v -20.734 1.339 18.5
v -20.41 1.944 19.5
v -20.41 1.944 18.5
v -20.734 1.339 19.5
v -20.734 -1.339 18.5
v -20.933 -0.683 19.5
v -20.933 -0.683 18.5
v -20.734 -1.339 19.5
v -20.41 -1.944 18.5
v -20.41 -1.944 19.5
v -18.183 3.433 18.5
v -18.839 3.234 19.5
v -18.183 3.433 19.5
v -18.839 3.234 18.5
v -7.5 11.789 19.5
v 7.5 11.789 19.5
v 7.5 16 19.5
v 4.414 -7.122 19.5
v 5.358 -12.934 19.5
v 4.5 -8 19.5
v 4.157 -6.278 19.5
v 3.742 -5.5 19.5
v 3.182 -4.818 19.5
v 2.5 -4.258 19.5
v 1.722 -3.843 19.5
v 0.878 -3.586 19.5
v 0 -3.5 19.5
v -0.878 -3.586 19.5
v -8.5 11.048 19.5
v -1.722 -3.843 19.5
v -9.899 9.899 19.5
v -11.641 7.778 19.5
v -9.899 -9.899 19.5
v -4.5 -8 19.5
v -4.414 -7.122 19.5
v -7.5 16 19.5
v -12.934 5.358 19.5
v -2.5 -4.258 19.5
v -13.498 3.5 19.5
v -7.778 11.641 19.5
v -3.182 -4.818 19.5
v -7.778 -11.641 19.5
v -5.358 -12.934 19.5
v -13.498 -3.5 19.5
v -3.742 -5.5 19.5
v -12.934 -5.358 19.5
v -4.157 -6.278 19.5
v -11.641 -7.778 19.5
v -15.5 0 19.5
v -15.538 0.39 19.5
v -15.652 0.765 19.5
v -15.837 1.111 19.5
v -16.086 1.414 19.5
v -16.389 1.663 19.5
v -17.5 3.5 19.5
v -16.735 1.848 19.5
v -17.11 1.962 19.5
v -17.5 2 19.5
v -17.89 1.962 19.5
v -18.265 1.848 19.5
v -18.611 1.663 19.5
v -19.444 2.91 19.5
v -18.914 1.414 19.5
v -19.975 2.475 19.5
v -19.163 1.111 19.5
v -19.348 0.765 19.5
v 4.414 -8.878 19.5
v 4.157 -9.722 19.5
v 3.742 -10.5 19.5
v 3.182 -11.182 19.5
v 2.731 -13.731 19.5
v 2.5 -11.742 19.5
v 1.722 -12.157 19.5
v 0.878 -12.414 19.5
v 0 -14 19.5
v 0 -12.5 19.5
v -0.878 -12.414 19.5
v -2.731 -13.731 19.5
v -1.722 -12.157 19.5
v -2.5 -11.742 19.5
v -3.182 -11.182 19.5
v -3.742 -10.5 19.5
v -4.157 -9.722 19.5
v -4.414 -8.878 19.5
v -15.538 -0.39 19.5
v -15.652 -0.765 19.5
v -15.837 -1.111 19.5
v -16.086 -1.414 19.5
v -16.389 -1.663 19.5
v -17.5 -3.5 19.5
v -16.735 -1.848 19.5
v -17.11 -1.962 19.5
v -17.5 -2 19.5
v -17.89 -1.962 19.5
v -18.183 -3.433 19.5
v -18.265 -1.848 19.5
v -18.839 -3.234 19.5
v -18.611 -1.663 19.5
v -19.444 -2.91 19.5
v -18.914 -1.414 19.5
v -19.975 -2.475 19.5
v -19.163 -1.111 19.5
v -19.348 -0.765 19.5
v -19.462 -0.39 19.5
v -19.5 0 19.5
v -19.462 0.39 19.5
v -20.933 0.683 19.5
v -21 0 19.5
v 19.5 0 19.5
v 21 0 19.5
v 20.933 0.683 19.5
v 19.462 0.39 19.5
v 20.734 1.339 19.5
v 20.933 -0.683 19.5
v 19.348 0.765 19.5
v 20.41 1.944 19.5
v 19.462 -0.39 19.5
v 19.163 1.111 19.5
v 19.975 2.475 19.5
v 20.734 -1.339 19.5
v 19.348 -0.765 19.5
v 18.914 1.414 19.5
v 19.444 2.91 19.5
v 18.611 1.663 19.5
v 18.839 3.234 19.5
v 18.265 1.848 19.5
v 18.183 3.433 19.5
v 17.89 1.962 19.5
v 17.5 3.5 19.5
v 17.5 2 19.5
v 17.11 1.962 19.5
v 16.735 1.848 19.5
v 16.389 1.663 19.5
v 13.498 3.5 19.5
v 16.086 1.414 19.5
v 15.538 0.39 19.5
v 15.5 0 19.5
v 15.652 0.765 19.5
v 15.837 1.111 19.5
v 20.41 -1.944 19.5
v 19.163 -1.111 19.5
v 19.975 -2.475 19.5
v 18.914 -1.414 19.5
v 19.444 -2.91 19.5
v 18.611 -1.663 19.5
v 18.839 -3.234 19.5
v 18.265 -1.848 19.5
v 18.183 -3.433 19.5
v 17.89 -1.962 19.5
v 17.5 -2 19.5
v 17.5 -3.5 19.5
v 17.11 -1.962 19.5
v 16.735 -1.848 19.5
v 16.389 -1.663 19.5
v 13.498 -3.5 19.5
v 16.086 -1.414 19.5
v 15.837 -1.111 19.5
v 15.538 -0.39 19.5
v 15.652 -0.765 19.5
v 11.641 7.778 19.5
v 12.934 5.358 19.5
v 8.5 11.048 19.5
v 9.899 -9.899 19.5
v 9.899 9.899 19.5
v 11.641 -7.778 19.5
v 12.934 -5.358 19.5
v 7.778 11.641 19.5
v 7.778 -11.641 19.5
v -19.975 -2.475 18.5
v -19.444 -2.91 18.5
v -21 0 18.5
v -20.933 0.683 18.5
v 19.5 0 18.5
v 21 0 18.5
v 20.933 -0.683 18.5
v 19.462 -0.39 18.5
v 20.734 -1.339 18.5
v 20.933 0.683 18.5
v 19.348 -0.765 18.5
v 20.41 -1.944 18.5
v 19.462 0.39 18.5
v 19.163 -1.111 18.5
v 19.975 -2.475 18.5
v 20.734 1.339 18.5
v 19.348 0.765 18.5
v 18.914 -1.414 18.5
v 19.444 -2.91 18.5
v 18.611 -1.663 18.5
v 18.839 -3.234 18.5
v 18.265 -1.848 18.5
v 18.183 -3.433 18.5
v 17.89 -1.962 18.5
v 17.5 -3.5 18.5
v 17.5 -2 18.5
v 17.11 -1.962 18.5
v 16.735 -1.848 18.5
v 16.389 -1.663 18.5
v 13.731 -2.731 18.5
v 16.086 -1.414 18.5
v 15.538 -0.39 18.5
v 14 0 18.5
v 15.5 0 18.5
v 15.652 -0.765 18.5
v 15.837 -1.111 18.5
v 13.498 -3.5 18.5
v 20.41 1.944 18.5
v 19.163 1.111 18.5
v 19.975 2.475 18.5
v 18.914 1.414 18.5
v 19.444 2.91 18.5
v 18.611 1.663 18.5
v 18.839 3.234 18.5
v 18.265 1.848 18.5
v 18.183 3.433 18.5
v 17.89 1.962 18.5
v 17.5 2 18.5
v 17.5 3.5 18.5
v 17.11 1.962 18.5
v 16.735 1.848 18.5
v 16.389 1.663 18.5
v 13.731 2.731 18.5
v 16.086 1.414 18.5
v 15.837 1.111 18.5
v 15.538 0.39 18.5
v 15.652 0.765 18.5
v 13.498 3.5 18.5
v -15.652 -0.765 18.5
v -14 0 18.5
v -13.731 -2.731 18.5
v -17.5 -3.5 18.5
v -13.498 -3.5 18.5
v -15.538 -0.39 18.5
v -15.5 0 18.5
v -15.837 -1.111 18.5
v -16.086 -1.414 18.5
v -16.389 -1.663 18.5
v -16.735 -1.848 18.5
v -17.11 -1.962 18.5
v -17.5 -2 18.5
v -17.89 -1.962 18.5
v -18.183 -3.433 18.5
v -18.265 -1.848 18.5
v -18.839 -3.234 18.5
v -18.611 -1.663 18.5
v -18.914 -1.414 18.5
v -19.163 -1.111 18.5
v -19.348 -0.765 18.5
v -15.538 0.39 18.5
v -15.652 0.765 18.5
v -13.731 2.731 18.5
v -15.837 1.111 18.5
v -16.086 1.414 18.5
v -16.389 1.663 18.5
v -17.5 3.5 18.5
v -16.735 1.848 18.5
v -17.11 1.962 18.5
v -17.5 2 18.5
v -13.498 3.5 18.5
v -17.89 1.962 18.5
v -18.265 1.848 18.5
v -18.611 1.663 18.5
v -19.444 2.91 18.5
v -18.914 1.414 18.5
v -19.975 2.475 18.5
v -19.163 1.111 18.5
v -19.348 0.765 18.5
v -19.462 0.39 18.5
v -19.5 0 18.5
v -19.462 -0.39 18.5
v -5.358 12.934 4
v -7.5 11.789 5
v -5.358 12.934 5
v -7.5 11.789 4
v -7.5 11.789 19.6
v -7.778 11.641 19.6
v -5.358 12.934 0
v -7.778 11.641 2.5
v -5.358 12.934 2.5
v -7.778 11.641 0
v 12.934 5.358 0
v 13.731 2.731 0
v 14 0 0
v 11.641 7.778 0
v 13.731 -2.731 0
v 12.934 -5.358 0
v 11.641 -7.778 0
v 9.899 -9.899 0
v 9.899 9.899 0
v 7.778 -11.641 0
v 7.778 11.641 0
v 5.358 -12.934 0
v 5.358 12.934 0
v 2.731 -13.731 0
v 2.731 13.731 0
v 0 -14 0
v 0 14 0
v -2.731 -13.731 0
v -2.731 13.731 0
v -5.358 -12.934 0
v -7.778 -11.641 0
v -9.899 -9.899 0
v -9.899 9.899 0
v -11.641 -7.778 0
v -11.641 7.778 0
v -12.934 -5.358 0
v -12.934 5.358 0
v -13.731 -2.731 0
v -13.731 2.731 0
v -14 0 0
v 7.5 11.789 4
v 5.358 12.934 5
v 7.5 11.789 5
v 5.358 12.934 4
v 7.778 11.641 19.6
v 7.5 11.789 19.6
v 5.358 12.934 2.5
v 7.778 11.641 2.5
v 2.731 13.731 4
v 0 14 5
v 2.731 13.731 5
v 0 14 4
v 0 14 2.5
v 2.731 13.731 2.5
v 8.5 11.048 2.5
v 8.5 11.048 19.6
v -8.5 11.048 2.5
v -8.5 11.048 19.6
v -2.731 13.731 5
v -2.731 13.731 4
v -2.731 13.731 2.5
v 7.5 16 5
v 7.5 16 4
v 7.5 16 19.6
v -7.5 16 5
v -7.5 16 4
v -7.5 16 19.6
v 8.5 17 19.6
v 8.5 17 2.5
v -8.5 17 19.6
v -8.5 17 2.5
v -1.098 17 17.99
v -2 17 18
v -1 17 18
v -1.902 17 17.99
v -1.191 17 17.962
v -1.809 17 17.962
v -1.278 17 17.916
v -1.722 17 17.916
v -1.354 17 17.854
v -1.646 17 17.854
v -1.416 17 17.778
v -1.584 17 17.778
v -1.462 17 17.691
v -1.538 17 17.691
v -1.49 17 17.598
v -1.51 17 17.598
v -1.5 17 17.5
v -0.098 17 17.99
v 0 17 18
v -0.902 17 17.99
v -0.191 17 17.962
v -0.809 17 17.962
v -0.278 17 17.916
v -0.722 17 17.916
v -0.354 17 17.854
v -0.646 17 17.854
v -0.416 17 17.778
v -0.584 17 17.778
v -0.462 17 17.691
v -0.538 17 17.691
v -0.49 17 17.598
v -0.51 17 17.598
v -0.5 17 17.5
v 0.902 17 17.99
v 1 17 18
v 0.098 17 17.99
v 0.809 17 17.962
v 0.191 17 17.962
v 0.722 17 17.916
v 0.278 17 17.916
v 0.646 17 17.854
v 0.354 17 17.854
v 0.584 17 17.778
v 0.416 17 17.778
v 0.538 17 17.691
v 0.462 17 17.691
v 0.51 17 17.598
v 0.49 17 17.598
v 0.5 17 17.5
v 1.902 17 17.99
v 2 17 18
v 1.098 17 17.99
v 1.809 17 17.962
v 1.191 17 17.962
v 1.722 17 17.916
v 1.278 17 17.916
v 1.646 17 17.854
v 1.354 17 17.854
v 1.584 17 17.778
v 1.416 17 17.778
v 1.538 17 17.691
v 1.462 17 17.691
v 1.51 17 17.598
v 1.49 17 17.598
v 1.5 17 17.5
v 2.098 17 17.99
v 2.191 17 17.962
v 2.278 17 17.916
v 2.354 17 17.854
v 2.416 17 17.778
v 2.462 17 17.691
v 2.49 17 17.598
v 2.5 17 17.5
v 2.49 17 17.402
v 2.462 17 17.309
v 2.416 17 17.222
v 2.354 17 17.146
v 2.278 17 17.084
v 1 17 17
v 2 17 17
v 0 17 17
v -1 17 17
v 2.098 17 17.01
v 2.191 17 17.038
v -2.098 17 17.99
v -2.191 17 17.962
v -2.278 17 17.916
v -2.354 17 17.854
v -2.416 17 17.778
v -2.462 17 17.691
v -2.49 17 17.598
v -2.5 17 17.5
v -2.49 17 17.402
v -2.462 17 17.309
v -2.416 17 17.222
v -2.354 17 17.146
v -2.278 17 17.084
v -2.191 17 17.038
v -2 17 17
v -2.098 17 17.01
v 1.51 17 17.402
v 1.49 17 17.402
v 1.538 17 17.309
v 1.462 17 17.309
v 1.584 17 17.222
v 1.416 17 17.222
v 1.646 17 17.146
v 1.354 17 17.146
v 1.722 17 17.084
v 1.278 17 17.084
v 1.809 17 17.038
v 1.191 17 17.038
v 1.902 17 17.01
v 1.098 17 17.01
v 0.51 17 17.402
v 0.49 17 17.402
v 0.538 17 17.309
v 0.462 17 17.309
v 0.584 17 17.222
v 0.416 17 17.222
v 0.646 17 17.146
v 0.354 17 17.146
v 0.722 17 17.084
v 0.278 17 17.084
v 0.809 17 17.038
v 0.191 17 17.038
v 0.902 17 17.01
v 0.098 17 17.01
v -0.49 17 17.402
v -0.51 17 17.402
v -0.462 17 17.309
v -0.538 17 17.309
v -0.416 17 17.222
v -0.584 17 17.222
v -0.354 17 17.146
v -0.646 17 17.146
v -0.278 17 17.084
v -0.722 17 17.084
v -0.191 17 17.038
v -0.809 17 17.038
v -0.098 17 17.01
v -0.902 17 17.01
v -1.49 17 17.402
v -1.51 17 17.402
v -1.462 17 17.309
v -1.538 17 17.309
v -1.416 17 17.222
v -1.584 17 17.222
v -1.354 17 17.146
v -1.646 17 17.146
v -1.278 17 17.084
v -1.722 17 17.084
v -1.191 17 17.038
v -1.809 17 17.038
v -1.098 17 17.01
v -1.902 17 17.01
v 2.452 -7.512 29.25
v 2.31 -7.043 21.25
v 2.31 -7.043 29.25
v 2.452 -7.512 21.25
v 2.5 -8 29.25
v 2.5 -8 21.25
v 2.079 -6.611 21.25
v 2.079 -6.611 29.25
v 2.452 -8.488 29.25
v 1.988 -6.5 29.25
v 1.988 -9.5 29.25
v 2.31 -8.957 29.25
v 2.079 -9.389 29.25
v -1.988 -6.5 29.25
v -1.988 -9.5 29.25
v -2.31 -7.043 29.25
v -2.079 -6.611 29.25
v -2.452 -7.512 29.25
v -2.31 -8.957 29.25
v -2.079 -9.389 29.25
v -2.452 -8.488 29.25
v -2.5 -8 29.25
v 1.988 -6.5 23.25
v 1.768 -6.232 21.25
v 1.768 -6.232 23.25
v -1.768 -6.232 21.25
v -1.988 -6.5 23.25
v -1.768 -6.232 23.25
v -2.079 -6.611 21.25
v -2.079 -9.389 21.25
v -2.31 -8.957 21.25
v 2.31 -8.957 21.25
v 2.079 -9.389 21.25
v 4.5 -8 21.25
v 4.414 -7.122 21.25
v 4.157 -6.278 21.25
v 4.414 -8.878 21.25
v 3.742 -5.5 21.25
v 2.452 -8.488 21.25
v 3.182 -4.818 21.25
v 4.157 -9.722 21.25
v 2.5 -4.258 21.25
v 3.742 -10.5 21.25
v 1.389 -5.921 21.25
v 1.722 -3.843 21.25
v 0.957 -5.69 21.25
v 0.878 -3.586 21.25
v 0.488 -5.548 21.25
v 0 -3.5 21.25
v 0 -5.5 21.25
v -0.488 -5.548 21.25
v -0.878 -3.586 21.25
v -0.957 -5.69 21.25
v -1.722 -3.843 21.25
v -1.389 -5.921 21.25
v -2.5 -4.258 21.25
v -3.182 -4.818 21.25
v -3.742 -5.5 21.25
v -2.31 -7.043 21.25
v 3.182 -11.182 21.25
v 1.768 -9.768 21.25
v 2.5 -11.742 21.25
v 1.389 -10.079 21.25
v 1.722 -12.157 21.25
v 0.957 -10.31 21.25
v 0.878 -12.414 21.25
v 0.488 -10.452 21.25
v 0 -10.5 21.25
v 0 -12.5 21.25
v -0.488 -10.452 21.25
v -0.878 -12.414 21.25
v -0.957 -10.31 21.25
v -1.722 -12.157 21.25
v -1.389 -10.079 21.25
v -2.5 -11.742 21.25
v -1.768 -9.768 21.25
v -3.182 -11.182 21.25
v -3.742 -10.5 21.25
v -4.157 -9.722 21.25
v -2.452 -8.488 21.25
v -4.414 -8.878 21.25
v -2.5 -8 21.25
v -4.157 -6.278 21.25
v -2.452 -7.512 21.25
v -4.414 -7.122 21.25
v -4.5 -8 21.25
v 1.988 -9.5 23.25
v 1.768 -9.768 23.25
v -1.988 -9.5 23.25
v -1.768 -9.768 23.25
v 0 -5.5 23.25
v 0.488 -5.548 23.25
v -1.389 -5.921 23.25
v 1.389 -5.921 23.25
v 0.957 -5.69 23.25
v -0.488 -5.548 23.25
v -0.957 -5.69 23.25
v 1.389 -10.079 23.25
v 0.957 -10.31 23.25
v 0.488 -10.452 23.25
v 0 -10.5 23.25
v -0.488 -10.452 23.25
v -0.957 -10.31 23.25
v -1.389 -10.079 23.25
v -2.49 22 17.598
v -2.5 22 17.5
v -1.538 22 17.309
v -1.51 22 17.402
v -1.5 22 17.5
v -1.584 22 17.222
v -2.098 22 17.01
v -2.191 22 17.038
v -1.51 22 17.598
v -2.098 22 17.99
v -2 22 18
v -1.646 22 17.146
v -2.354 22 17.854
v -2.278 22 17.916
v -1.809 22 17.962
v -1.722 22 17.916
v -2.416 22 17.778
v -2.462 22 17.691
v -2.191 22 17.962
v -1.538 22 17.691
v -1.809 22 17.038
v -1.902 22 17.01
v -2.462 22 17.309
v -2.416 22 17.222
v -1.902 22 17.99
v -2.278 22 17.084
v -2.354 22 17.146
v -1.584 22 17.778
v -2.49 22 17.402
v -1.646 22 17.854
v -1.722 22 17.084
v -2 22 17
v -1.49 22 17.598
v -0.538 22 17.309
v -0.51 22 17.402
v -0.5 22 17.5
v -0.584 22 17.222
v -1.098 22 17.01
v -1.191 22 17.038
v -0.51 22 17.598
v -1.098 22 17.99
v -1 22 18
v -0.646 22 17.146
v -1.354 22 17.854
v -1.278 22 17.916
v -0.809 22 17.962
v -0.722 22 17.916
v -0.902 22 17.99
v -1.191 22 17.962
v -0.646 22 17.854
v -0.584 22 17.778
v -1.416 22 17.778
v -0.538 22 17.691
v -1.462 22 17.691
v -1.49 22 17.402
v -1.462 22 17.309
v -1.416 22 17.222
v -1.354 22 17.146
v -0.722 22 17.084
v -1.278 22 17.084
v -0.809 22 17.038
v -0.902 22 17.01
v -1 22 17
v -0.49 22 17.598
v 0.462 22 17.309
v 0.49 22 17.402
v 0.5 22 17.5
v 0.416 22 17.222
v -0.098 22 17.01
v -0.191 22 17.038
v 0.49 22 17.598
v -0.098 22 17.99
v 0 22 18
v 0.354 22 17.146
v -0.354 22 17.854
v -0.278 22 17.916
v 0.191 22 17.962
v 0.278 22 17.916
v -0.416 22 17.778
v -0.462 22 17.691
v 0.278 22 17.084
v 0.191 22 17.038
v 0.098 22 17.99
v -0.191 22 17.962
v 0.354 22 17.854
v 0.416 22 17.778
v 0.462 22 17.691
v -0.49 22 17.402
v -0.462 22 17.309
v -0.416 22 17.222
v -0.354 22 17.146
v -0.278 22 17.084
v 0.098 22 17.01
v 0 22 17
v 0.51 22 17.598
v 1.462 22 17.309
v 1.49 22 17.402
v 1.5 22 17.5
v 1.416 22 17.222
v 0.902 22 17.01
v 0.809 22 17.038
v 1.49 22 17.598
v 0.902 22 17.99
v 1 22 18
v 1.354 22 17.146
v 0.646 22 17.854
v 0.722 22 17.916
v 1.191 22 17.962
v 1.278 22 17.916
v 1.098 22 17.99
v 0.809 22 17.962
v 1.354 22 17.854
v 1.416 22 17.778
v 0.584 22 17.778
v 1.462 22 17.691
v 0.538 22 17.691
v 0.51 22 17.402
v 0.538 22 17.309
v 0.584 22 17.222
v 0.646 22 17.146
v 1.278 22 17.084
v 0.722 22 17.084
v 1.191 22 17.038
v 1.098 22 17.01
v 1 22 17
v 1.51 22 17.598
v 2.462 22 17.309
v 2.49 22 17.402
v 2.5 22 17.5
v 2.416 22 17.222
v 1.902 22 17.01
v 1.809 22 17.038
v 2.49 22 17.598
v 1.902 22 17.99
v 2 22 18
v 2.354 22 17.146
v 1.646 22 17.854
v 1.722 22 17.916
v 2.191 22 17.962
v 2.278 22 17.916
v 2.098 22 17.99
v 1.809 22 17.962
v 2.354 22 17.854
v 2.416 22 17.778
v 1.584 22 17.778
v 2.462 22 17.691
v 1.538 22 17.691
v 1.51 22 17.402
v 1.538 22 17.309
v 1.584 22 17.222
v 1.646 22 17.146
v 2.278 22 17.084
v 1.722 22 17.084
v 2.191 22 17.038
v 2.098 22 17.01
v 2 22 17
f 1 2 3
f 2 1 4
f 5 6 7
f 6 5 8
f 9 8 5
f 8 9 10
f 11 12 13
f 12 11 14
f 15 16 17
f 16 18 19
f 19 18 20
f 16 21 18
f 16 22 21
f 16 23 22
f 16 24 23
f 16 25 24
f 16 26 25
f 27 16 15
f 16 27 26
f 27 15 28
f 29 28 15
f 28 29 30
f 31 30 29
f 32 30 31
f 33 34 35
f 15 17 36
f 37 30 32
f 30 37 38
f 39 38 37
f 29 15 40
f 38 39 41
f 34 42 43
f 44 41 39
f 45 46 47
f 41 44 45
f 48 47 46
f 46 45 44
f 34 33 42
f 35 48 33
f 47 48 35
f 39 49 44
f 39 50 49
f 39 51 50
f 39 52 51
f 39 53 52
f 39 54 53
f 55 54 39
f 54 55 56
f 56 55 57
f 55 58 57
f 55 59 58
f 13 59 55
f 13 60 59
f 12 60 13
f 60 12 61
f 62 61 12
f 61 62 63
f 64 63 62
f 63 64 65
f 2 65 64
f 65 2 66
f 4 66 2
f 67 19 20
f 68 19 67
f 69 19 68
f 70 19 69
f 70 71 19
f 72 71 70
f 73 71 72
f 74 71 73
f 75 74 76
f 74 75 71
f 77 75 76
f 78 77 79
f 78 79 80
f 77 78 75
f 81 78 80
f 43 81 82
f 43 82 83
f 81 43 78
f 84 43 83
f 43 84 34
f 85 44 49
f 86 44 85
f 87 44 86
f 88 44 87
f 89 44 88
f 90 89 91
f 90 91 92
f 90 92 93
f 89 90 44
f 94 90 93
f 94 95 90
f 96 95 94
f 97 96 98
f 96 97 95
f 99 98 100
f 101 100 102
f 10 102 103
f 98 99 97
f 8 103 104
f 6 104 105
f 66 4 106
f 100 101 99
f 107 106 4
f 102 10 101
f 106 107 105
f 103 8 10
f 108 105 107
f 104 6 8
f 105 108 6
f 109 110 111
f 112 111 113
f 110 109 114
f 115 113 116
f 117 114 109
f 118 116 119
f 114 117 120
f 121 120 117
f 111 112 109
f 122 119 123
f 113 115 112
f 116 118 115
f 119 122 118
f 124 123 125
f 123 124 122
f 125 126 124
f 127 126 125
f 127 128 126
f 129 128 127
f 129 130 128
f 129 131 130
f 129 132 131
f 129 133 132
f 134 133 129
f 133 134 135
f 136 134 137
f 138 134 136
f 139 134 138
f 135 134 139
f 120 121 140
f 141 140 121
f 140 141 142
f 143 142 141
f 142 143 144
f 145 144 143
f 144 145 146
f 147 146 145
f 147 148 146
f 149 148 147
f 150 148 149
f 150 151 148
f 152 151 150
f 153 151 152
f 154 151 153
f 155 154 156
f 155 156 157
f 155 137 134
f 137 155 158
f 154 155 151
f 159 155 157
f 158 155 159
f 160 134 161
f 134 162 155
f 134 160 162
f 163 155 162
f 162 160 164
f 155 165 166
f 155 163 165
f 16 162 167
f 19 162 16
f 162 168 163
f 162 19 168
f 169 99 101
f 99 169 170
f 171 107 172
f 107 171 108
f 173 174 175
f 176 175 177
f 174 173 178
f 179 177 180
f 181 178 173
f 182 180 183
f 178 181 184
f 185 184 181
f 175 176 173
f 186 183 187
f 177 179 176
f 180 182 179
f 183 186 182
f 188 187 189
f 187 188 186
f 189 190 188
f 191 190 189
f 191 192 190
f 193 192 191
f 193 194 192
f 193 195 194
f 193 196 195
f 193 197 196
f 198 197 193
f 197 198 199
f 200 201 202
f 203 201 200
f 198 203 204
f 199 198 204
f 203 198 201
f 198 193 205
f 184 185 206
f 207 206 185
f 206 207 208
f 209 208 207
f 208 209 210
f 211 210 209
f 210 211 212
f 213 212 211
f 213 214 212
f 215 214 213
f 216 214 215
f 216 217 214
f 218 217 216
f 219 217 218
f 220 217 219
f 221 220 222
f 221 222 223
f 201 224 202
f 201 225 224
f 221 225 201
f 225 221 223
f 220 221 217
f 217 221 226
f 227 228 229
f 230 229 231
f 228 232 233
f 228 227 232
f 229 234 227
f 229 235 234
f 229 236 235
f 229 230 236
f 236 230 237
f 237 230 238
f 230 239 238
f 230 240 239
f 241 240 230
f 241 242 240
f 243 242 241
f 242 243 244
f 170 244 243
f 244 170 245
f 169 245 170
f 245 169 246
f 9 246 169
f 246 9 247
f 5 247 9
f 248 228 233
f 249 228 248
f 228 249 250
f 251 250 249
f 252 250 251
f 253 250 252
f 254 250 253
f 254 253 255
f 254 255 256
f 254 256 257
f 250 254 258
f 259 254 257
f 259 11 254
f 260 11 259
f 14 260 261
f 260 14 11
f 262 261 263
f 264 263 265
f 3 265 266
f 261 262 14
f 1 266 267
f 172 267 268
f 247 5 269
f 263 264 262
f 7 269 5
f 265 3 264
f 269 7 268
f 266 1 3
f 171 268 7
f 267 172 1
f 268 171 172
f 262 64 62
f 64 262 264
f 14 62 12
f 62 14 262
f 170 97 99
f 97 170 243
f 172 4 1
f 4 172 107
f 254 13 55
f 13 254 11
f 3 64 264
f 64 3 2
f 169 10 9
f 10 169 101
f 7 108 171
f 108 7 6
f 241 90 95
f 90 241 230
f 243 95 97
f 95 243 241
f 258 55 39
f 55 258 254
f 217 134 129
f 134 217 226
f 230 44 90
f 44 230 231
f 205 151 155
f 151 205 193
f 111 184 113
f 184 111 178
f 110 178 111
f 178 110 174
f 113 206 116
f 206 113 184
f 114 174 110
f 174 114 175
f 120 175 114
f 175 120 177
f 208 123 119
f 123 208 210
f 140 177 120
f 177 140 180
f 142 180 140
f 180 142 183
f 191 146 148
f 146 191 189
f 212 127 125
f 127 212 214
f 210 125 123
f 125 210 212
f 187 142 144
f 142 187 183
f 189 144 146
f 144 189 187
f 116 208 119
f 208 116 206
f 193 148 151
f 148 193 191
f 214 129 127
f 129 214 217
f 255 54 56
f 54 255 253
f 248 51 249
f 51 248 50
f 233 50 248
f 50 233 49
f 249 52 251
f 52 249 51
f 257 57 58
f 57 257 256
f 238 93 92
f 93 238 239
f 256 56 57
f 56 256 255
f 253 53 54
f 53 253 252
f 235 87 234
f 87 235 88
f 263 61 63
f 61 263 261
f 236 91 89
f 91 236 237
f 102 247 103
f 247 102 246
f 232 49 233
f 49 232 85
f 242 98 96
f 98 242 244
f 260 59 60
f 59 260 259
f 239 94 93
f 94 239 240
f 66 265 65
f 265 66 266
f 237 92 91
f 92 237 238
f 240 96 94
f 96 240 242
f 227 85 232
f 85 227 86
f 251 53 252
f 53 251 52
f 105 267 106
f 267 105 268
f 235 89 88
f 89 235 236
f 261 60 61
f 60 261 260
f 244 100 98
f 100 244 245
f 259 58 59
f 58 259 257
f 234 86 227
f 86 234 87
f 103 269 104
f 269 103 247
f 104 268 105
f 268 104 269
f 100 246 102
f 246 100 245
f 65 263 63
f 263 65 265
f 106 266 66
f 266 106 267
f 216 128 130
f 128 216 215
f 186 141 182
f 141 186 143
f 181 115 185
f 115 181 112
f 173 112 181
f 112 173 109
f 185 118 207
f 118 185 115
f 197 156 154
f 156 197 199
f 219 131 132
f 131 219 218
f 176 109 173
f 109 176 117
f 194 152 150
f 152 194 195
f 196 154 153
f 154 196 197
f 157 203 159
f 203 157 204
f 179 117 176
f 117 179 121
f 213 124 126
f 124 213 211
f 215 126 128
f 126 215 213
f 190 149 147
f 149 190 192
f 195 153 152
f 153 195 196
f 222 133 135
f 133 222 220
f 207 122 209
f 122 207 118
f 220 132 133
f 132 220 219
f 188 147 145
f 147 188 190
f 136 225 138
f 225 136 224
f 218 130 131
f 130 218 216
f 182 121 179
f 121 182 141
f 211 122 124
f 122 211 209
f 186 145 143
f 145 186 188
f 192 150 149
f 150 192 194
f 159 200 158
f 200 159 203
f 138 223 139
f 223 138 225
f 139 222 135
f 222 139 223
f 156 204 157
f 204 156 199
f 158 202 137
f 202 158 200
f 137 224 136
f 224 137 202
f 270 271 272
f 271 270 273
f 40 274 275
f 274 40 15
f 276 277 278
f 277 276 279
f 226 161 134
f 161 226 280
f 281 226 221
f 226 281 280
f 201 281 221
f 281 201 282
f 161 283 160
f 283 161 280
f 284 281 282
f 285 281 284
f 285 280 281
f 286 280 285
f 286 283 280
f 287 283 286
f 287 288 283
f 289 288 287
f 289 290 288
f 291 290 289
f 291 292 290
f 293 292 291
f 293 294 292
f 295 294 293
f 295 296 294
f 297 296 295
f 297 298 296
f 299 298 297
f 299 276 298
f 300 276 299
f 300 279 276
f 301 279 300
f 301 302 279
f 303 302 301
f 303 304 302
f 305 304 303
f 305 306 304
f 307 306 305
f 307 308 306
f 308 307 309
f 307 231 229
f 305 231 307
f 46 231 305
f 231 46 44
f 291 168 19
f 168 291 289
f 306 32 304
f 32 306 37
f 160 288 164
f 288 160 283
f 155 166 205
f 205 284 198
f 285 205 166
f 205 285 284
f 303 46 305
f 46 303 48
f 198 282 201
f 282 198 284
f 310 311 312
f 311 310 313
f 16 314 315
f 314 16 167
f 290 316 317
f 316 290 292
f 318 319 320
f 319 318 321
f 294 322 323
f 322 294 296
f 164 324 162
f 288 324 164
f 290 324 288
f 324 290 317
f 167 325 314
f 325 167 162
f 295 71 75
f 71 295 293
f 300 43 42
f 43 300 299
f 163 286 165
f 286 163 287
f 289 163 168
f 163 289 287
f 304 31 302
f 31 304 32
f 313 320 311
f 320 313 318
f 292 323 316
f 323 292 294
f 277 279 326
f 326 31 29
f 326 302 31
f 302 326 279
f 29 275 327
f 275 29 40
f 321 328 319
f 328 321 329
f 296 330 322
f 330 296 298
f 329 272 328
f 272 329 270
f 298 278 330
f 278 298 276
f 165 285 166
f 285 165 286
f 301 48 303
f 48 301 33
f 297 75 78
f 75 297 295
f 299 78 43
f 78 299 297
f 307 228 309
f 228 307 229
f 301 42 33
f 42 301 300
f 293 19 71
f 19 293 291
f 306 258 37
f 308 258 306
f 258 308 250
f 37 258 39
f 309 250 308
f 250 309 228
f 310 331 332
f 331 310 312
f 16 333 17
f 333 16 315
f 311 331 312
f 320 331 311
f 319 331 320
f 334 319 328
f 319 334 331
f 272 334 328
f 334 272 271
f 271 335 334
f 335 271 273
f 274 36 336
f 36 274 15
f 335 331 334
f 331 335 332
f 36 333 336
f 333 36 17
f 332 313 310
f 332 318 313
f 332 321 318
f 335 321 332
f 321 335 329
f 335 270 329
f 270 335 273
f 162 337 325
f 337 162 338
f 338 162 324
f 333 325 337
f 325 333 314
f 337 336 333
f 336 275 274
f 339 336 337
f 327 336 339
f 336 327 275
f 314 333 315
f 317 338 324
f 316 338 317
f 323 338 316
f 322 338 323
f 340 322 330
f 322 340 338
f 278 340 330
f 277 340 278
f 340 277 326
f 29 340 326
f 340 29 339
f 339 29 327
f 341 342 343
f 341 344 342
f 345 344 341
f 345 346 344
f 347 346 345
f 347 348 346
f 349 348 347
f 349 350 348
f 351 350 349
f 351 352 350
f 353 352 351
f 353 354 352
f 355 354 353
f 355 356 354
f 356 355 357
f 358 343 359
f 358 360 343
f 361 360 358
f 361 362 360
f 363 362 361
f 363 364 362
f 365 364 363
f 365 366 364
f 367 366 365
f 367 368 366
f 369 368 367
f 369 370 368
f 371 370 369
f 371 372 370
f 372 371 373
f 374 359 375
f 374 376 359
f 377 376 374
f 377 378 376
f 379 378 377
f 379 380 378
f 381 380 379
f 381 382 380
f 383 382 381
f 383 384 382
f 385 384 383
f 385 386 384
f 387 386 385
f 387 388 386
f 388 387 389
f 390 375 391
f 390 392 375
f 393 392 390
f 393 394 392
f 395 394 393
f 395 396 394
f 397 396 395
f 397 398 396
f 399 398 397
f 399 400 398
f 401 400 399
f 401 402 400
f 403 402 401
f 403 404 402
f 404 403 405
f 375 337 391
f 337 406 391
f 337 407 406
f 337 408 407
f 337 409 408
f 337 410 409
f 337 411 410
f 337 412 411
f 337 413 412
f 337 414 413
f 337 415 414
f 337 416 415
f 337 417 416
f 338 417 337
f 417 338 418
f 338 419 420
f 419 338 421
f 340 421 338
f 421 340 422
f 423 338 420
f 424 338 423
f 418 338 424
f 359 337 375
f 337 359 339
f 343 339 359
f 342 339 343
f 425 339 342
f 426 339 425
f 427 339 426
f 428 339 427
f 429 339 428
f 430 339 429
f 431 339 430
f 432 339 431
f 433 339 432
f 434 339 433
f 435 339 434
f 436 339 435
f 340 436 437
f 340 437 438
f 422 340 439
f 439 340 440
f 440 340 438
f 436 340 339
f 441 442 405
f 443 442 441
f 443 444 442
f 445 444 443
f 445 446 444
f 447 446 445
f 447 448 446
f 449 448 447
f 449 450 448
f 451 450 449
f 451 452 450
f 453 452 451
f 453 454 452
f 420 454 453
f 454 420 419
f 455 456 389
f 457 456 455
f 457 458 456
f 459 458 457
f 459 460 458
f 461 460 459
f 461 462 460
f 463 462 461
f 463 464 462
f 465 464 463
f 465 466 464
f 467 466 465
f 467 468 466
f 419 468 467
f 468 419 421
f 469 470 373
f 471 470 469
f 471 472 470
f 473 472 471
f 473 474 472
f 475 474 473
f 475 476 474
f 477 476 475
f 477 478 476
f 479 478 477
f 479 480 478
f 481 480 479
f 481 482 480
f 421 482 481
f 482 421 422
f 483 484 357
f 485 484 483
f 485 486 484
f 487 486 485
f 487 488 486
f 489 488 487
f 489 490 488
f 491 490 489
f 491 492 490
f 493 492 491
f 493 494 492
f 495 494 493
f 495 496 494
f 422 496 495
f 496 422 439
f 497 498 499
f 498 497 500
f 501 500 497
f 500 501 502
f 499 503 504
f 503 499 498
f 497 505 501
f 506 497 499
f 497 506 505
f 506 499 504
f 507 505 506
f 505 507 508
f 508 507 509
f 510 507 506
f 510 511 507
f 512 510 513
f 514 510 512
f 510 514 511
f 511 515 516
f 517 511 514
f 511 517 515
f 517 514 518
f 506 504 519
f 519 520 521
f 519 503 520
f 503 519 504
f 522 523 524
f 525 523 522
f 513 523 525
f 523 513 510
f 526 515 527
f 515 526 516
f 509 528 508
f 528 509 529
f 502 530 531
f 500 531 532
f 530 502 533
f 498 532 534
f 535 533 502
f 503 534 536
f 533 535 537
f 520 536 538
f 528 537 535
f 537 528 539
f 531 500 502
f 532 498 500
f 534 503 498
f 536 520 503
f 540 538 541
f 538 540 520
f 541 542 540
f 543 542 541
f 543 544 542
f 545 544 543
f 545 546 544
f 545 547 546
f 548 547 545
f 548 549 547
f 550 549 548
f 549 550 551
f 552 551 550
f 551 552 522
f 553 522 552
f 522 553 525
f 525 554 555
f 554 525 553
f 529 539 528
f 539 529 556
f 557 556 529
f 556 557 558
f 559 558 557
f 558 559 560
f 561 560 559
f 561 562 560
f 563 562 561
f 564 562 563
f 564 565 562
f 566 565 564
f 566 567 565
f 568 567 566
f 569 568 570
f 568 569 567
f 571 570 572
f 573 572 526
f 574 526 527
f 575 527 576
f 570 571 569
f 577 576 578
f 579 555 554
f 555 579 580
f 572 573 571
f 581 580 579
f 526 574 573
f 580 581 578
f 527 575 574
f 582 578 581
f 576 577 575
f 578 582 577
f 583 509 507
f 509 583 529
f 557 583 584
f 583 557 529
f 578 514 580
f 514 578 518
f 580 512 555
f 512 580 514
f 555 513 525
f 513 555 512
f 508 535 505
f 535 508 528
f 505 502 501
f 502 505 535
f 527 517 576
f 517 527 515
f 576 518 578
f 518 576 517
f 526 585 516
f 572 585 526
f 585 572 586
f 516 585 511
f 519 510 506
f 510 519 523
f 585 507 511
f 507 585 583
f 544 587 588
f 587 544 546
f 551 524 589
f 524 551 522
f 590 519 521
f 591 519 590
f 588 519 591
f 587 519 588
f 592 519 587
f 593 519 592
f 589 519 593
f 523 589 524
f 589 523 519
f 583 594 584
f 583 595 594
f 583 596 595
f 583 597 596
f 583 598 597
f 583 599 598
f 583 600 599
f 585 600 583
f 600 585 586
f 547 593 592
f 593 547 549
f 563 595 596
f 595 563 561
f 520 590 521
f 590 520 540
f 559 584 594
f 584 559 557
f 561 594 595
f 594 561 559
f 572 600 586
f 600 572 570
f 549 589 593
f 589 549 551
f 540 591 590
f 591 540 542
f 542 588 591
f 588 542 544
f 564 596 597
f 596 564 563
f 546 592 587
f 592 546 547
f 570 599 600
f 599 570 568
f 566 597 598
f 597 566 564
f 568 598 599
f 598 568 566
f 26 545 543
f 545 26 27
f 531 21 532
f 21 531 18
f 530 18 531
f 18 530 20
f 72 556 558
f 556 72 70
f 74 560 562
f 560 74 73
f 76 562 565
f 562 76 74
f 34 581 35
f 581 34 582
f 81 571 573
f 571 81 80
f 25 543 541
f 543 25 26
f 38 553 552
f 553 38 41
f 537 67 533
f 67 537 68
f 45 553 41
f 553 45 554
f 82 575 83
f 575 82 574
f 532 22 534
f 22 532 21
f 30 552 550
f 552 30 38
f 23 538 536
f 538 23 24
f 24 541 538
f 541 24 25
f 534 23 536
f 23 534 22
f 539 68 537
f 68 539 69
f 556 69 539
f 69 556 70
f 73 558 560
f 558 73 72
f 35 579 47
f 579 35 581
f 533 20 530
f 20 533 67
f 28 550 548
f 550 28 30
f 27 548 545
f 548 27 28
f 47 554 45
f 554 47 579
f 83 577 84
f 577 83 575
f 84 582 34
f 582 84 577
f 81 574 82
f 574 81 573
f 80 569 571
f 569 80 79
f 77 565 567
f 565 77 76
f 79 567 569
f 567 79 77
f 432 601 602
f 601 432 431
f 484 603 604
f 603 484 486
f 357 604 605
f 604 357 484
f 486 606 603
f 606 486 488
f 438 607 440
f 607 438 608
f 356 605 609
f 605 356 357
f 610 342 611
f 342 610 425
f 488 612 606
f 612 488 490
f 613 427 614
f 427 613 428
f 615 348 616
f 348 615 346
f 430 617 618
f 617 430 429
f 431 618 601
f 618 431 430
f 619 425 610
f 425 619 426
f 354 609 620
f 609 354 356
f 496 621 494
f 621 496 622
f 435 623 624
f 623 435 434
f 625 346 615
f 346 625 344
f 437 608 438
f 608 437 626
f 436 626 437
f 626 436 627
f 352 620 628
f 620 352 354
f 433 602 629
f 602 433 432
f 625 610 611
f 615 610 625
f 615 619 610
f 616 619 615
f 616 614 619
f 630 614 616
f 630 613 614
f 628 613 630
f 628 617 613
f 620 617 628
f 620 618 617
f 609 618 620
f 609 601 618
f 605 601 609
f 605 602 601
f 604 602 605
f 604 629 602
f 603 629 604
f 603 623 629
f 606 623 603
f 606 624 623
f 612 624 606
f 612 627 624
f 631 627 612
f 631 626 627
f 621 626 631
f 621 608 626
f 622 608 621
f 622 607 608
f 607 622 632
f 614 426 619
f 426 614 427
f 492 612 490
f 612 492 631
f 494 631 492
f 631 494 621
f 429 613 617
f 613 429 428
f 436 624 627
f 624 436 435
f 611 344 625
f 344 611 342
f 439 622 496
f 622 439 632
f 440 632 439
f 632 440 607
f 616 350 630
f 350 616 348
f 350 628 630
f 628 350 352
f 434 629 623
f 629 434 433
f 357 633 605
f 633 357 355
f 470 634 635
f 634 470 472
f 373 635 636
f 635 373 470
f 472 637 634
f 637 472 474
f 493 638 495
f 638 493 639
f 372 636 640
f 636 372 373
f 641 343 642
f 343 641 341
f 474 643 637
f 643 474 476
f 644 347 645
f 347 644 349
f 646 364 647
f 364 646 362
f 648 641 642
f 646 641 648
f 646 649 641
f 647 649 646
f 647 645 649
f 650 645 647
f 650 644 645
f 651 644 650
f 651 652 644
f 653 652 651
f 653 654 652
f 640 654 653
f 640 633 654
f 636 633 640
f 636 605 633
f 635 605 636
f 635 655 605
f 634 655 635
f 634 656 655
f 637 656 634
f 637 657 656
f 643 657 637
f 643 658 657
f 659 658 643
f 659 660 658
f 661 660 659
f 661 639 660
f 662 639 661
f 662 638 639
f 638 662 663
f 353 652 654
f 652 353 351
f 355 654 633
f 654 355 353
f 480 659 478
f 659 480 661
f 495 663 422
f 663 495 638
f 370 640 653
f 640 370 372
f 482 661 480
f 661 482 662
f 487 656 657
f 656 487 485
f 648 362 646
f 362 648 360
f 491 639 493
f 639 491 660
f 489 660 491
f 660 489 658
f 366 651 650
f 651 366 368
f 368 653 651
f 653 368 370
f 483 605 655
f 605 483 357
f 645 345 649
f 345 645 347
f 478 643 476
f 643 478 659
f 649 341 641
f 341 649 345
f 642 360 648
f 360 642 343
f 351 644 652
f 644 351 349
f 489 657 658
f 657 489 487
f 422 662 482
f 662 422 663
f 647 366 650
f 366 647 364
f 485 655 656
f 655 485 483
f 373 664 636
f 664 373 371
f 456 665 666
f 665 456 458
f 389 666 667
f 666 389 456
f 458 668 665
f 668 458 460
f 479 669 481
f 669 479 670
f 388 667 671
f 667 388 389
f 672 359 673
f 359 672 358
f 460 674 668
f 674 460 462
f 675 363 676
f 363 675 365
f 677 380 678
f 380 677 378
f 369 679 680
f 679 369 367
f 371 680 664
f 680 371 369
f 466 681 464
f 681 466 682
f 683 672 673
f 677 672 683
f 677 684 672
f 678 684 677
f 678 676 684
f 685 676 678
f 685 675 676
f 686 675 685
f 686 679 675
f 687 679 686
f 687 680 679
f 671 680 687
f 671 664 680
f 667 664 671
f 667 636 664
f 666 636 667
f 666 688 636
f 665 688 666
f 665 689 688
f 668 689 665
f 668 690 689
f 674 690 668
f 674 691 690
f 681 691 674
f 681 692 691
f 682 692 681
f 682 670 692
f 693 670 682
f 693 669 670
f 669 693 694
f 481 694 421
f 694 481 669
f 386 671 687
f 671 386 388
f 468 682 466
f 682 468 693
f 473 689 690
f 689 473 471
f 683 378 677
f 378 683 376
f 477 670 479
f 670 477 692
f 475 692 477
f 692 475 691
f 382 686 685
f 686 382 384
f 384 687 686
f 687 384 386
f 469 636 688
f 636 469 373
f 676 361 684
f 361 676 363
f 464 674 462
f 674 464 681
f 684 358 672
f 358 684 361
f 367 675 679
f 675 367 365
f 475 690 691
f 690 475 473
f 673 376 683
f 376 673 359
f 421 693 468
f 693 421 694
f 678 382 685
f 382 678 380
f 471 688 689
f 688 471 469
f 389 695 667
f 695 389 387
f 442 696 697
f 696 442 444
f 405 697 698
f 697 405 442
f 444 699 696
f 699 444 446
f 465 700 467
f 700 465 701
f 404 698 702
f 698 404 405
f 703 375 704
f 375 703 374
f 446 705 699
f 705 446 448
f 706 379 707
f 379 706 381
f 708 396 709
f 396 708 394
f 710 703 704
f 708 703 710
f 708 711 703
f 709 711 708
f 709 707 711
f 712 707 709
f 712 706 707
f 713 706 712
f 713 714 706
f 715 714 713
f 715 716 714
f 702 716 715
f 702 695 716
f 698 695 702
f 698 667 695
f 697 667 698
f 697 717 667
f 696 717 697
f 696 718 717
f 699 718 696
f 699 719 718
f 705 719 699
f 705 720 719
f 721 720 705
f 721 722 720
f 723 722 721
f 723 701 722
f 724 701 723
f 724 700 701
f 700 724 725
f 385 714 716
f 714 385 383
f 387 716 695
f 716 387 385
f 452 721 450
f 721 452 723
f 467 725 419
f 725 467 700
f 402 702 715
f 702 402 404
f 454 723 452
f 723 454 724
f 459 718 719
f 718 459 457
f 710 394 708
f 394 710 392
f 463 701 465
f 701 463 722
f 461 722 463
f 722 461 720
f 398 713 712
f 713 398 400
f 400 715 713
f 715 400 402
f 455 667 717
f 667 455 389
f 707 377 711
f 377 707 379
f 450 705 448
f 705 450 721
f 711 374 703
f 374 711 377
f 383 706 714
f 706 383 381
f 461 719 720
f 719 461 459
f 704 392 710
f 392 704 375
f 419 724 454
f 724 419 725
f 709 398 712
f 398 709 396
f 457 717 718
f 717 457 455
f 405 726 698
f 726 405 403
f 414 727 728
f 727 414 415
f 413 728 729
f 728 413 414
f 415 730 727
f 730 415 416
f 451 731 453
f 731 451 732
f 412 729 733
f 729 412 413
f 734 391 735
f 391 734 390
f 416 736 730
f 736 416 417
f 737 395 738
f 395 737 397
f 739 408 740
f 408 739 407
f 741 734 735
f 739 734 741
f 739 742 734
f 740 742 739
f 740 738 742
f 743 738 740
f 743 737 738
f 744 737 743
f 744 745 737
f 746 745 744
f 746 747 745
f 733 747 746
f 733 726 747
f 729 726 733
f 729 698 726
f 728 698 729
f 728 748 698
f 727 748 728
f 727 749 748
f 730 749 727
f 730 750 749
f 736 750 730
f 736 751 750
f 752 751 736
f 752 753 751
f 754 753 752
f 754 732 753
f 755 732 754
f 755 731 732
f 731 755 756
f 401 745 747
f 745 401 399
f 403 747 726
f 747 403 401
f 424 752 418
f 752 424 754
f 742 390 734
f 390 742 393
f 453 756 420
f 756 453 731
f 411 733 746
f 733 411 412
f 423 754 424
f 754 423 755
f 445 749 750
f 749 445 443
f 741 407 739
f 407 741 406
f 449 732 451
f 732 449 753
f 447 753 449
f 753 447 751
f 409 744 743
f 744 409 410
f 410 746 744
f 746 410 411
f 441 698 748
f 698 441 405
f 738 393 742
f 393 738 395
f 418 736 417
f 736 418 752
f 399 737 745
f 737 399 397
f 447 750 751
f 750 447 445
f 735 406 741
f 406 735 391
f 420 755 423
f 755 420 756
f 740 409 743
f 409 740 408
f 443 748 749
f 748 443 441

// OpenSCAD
$fn=32;

motor();

module motor() {
  color("silver") mainMotorBody();
 
  color("#4287f5") plasticPart(); 
  translate([0,-8,19.5]) {
    color("white") cylinder(r=4.5,h=1.75);
    translate([0,0,1.75]) motorPeg();
  }

  translate([0,17,17.5]) rotate([-90,0,0]) cables();
}

module mainMotorBody(bh=19.5) {
  cylinder(r=14,h=bh); 
  translate([-15/2,17-6,5]) cube([15,5,bh-5]); 
  translate([0,0,bh-1]) screwBar();
}

module plasticPart() {
  difference() {
    translate([-17/2,17-6,2.5]) cube([17,6,17.1]); 
    translate([0,0,-1]) mainMotorBody(30);
  }
}

module cables() {
  colors = ["yellow", "orange", "red", "pink", "blue"];
  cr=0.5;
  translate([len(colors)*-cr,0,0]) {
    for (i = [ 0 : len(colors) - 1 ]) {
      translate([i*cr*2+cr,0,0]) color(colors[i]) cylinder(r=cr,h=5);
    }   
  }
}

module screwBar() {
  translate([-35/2,0,0]) difference() {
    union() {
      cylinder(r=3.5,h=1);
      translate([0,-7/2,0]) cube([35,7,1]);
      translate([35,0,0]) cylinder(r=3.5,h=1);
    }
    translate([0,0,-0.5]) cylinder(r=2,h=2);
    translate([35,0,-0.5]) cylinder(r=2,h=2);
  }
}

module motorPeg() {
  intersection() {
    cylinder(r=2.5,h=8);
    translate([-2.5,-1.5,0]) cube([5,3,8]);
  }
  cylinder(r=2.5,h=2);
}
